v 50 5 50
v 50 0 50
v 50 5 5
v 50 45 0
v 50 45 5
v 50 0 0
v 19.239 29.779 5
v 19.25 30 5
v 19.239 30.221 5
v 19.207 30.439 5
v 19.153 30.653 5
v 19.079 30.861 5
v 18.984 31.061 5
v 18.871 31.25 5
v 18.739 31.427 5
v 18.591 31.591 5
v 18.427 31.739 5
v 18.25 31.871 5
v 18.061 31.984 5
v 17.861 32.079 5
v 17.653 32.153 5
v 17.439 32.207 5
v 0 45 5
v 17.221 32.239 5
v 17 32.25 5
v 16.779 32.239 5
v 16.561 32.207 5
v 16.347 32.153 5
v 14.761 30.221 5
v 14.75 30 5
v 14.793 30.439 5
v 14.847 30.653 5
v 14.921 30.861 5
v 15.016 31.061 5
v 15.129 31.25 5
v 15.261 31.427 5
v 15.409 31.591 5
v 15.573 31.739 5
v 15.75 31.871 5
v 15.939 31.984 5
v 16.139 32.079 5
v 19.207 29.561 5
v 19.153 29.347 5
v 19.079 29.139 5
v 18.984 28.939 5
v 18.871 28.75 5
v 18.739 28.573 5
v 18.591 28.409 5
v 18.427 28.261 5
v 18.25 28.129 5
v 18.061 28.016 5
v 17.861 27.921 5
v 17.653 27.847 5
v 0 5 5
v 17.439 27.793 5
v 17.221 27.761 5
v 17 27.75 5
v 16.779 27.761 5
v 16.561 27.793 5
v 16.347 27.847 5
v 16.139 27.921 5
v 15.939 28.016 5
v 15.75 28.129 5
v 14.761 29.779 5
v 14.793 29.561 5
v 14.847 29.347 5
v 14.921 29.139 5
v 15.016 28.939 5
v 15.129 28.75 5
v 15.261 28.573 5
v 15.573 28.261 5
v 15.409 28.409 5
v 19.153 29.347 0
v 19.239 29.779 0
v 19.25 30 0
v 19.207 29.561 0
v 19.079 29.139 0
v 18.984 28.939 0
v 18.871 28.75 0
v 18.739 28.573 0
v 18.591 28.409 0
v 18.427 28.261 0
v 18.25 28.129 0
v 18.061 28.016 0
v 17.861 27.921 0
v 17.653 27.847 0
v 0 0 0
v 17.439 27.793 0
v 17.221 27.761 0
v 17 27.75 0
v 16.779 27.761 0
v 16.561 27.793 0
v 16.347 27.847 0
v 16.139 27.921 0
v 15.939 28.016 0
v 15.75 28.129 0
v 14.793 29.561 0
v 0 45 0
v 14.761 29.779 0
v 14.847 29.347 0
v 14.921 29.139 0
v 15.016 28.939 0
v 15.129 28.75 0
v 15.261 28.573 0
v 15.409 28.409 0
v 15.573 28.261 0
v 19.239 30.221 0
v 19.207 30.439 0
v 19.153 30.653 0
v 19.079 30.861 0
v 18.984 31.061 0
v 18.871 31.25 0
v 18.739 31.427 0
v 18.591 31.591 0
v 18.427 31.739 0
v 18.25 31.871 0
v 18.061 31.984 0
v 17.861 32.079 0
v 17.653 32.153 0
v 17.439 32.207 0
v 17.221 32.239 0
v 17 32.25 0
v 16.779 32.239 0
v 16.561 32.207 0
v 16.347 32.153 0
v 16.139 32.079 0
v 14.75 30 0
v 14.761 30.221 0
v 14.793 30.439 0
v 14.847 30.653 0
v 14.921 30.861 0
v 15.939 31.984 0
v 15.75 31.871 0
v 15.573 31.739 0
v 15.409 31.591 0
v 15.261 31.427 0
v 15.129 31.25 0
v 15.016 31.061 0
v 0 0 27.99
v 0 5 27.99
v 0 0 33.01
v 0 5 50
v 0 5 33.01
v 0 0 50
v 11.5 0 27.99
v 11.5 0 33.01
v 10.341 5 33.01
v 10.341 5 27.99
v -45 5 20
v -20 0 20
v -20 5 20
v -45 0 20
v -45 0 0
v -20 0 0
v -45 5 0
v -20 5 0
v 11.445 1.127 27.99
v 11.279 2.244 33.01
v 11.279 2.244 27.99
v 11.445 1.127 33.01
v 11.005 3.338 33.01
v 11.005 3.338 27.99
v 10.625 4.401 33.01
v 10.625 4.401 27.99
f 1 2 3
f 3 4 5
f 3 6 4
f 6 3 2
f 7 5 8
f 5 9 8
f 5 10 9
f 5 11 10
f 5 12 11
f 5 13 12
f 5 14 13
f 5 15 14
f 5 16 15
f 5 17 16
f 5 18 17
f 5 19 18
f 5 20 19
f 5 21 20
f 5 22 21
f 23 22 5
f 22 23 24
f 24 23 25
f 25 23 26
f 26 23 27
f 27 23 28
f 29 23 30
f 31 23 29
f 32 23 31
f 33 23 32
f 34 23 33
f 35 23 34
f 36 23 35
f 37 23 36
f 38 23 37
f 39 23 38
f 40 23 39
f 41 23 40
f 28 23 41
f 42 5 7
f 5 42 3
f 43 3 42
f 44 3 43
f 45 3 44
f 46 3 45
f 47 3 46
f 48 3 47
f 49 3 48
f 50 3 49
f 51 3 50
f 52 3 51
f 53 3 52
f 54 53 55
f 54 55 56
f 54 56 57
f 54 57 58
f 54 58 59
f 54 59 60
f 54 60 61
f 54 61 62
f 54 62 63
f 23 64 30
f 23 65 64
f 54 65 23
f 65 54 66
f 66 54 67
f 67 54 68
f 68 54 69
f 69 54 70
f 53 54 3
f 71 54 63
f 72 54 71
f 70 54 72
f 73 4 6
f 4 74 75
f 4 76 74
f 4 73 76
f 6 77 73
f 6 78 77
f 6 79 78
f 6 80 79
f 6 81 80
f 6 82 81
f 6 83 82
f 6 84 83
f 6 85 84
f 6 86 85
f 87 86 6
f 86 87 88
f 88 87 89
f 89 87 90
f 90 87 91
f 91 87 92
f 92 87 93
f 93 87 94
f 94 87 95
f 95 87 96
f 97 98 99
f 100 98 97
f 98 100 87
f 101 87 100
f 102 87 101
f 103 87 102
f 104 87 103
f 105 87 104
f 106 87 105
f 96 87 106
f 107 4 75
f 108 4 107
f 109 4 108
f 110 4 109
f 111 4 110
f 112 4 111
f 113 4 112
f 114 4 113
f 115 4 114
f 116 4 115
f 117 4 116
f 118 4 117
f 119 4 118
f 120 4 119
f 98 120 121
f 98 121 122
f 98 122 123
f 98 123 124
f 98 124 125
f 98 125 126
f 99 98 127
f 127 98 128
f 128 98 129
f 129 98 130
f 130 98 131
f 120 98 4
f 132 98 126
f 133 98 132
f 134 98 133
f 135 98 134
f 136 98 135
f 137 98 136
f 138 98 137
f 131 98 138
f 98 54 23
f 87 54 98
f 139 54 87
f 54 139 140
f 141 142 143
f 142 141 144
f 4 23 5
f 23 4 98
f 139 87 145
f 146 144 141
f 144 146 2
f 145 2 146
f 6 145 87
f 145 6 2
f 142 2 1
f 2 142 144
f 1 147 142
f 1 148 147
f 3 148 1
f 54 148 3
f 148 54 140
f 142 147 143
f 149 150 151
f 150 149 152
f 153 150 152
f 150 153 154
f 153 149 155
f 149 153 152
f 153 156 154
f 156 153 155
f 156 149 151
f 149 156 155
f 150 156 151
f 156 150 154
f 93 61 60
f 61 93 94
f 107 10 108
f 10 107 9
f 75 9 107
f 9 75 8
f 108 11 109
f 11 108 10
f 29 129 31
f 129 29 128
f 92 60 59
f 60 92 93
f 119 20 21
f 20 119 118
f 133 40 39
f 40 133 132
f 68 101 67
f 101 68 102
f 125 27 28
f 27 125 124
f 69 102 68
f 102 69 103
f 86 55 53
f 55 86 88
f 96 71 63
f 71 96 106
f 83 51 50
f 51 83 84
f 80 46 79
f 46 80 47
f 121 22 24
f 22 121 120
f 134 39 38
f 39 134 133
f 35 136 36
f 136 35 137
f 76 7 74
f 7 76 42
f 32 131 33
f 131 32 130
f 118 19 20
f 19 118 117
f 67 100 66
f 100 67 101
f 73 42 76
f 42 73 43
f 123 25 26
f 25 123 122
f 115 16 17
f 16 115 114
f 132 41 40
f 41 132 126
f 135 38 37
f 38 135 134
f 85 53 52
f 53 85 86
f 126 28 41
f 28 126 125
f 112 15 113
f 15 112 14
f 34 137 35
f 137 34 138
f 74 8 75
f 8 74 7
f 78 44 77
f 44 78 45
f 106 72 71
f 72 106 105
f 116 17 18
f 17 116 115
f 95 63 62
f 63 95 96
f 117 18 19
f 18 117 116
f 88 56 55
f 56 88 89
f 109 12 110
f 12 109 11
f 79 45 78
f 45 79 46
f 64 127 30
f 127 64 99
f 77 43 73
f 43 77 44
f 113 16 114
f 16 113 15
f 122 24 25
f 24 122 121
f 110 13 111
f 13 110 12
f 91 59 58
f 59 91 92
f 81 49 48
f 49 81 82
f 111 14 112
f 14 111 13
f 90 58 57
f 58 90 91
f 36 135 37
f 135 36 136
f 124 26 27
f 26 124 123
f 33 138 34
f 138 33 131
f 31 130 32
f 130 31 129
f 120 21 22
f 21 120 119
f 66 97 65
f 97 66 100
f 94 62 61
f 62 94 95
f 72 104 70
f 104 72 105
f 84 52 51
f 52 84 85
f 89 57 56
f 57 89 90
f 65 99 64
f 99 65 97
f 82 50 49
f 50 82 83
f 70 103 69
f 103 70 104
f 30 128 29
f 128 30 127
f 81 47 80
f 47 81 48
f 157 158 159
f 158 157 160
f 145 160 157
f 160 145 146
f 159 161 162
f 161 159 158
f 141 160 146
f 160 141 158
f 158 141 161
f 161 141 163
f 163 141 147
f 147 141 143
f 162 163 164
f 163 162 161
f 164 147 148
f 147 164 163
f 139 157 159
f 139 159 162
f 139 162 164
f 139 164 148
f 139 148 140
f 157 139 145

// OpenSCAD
// NEMA 17 L-Shaped Mounting Bracket
// Units: mm

// --- Dimensions ---
base_x = 50;       // Base plate width (x: -25 to 25)
base_y = 45;       // Base plate length (y: 0 to 45)
base_z = 5;        // Base plate thickness

motor_plate_x = 50; // Motor plate width (x: -25 to 25)
motor_plate_y = 5;  // Motor plate thickness (y: 0 to 5)
motor_plate_z = 50; // Motor plate height (z: 0 to 50)

hole_m4_d = 4.5;    // M4 screw hole diameter
hole_m4_offset_x = -17; // M4 hole 1 x position
hole_m4_offset_y = 30;  // M4 hole 1 y position

hole_m3_d = 3.4;    // M3 screw hole diameter
hole_m3_spacing = 31; // M3 screw pattern spacing
hole_m3_center_z = 28; // M3 hole center z position

gusset_thickness = 5; // Gusset thickness
gusset_leg_y = 20;    // Gusset leg along +Y
gusset_leg_z = 20;    // Gusset leg along +Z
gusset_x_start = -25; // Gusset left edge x
gusset_x_end = -20;   // Gusset right edge x (left side)

// --- Settings ---
$fn = 64; // High resolution for curves

// --- Main Body ---
module main_body() {
    union() {
        // Base Plate
        translate([0, 0, 0])
            cube([base_x, base_y, base_z]);

        // Vertical Motor Plate
        translate([0, 0, 0])
            cube([motor_plate_x, motor_plate_y, motor_plate_z]);

        // Left Gusset
        translate([gusset_x_start, 0, 0])
            rotate([0, 0, 90])
                cube([gusset_thickness, gusset_leg_y, gusset_leg_z]);

        // Right Gusset
        translate([gusset_x_end, 0, 0])
            rotate([0, 0, 90])
                cube([gusset_thickness, gusset_leg_y, gusset_leg_z]);
    }
}

// --- Cutouts ---
module cutouts() {
    difference() {
        main_body();

        // 1. M4 Holes in Base Plate
        // Hole 1
        translate([hole_m4_offset_x, hole_m4_offset_y, -0.01])
            cylinder(h = base_z + 0.02, d = hole_m4_d);
        // Hole 2
        translate([-hole_m4_offset_x, hole_m4_offset_y, -0.01])
            cylinder(h = base_z + 0.02, d = hole_m4_d);

        // 2. Motor Boss Hole in Motor Plate
        // Located at x=0, z=28. Extends through the plate thickness (y=0 to 5).
        translate([0, 0, hole_m3_center_z - 0.01])
            cylinder(h = motor_plate_y + 0.02, d = 23);

        // 3. M3 Screw Holes in Motor Plate
        // Pattern centered at x=0
        for (x = [-hole_m3_spacing/2, hole_m3_spacing/2]) {
            for (y = [-hole_m3_spacing/2, hole_m3_spacing/2]) {
                translate([x, y, hole_m3_center_z - 0.01])
                    cylinder(h = motor_plate_y + 0.02, d = hole_m3_d);
            }
        }
    }
}

// --- Render ---
cutouts();
